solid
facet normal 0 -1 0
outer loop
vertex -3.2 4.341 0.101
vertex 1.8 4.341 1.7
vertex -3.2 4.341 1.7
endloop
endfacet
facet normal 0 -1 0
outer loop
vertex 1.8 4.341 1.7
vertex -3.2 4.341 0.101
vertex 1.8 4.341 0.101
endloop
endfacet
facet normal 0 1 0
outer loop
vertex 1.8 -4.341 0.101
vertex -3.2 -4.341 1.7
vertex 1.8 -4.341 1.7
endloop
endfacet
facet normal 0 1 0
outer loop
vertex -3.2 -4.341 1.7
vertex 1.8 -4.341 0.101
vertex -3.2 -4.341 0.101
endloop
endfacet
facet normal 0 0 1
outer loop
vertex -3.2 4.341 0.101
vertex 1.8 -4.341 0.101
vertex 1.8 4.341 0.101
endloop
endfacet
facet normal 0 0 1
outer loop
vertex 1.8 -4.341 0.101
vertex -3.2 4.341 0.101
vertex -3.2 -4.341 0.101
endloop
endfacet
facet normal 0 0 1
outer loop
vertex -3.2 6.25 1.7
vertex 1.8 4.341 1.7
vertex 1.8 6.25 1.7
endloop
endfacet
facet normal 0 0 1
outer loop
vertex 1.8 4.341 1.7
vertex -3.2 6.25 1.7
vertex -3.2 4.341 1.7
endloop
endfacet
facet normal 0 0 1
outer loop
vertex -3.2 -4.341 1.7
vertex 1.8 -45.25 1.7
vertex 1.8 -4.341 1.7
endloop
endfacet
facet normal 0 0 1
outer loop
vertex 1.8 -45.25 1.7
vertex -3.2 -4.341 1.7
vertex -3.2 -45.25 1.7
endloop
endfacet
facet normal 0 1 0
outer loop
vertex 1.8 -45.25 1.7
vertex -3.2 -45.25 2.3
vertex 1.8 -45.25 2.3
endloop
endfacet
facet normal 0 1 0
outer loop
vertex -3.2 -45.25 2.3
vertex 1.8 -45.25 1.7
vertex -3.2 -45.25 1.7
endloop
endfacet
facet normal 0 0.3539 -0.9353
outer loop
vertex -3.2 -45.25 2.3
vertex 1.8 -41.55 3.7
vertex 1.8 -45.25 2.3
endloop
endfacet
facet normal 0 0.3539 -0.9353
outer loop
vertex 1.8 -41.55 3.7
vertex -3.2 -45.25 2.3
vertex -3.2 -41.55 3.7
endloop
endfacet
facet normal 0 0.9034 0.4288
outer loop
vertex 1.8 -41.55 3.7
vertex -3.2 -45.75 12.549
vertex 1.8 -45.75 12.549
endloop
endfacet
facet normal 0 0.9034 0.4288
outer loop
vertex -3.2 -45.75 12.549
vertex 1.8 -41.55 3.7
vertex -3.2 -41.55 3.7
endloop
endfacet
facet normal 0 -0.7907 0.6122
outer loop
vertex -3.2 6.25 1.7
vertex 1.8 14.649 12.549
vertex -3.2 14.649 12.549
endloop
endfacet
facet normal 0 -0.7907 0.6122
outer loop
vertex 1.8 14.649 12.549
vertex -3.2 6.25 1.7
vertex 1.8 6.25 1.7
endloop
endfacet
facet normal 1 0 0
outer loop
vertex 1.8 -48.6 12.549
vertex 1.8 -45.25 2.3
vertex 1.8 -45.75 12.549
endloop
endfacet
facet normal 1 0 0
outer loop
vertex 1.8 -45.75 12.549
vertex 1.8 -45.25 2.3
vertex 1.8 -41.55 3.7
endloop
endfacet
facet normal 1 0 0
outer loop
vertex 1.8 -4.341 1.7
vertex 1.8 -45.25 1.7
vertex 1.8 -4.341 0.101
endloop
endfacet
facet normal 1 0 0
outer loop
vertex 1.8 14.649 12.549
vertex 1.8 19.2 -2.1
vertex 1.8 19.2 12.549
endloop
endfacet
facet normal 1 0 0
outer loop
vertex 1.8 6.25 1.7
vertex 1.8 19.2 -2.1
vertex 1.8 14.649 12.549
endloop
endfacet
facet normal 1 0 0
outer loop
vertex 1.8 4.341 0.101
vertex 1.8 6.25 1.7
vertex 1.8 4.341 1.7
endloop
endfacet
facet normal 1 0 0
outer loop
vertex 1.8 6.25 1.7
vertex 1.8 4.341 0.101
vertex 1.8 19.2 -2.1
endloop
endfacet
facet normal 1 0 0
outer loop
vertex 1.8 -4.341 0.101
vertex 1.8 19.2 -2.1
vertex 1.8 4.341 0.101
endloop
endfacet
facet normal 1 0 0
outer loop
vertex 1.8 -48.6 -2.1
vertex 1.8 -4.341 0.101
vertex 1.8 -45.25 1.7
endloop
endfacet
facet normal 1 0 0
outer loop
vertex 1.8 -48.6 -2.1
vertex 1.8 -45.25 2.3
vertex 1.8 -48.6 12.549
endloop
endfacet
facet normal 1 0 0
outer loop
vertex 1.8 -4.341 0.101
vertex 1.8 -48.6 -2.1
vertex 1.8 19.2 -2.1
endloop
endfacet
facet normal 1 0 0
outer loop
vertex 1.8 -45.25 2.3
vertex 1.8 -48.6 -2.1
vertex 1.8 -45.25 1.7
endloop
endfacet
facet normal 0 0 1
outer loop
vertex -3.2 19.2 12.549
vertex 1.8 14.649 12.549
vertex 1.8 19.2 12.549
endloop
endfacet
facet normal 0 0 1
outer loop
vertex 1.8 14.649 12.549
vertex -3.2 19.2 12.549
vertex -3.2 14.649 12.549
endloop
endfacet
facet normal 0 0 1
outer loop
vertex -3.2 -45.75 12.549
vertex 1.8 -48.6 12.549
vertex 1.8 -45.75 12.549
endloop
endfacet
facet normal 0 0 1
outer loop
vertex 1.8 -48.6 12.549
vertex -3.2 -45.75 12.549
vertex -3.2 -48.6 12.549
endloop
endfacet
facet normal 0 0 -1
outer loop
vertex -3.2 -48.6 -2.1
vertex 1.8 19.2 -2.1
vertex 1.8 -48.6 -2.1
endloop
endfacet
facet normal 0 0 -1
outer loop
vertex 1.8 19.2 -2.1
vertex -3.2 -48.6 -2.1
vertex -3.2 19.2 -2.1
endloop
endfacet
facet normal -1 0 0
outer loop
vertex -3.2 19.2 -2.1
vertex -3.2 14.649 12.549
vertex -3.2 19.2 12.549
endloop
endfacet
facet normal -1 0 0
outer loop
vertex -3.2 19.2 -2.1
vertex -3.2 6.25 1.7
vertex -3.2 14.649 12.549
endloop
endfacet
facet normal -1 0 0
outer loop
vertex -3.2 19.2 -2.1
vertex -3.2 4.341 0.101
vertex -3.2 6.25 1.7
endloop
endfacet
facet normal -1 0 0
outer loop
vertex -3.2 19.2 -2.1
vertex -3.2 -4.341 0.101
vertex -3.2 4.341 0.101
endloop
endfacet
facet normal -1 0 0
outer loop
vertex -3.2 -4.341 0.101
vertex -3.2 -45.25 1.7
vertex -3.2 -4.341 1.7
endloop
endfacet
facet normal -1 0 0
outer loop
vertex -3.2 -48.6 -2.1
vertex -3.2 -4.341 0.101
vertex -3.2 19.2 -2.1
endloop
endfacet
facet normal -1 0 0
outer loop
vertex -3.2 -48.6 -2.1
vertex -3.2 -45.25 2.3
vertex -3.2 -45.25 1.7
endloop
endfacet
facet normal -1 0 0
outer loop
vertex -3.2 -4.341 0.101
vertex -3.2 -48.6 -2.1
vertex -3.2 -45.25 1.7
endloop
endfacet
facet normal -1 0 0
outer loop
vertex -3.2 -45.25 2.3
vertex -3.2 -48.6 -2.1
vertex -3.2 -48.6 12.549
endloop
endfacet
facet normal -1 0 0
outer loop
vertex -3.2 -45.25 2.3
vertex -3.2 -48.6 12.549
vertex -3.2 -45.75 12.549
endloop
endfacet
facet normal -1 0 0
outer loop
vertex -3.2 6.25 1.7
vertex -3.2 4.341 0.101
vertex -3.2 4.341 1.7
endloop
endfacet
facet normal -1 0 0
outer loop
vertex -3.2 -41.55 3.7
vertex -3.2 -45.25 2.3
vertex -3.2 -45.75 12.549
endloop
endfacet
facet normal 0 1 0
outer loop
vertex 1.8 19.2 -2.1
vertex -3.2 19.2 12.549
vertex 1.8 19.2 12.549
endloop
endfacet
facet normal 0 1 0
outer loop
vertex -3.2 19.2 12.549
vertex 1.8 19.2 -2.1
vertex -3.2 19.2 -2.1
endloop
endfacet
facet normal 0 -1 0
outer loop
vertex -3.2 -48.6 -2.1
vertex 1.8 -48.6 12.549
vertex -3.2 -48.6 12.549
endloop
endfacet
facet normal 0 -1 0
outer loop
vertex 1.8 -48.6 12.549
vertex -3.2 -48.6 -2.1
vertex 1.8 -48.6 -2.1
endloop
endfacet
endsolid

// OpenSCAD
// Bosch Kiox display holder

// point 0,0,0 is at the center of the magnetic part

// Some material definitions
// defaults in prusa slicer 0.15 height (0.2 first layer)
layer_1=0.2;
layer_n=0.15;

// overall (max measurements)
disp_w=46.4; // rough measurement
disp_l=67.8; // also rough measurement
// base
base_w=36.6;
base_l=52.8;

// oval part which holds the display in place
magnet_part_d1=8.4;
magnet_part_d2=20.4-magnet_part_d1;
magnet_part_h=1.7;

top_disp=24.4-magnet_part_d1/2; // from the top

// nodge to align the display at the bottom
base_a_disp=39.25+1.5+magnet_part_d1/2;
height_a=magnet_part_h;
height_b=height_a+2;
height_c=height_a+10.85;
height_d=height_a+12.8;

module magnet_part(
        d1=magnet_part_d1+0.3,
        d2=magnet_part_d2,
        h=magnet_part_h,
        fix=0.1        
    ) {
    hull() {
        // make heigt a bit smaller to really have
        // the magnets stick (no air in between)
        translate([-d2/2,0,fix+0.001])
            cylinder(h=h-fix,d=d1);
        translate([d2/2,0,fix+0.001])
            cylinder(h=h-fix,d=d1);
    }
}

module magnets(
        d1=magnet_part_d1+0.2,
        d2=magnet_part_d2,
        h=magnet_part_h,
        fix=0.1,
        magnet_w=5,
        magnet_h=1+0.6 // plus double sided tape thickness
    ) {
    translate([0,-magnet_w/2,-magnet_h+fix+0.002-layer_n*1]) {
        translate([(-d2-magnet_w)/2,0,0])
            cube([magnet_w,magnet_w,magnet_h]);
        translate([( d2-magnet_w)/2,0,0])
            cube([magnet_w,magnet_w,magnet_h]);
    }
}

// model countersunk screw for 3d printing
// useful for creating attachement bores
// which fit these screws
// default values are for 3mm x 20mm screw with 6mm head (3.2mm bore for tolerance)
module screw_countersunk(
        z  = height_a, //displacement z
        l  = 22,     //length
        dh =  7.3,   //head dia
        db =  3.3,   //base dia (smaller icw ds)
        lh =  2.2,   //head length
        ds =  3.9,   //shaft dia
        )
{
    translate([0,0,z-lh+0.01])
        cylinder(h=lh, r1=db/2, r2=dh/2, $fn=20);
    translate([0,0,z-lh+0.02-l])
        cylinder(h=l, d=ds, $fn=20);
}
*translate([-disp_w/4,-10,0.1]) screw_countersunk();


module back_plate(
    ) {
    
    // a is base plane
    za=height_a;
    xa1=19.5/2; ya1=-0.3;
    xa2=22.0/2; ya2=03.4; 
    xa3=25.0/2; ya3=ya2;
    xa4=31.4/2; ya4=24.2;
    xa5=35.8/2; ya5=ya4;
    xa6=32.8/2; ya6=ya4+27;
    points_a = [
        [-xa1,ya1,za],
        [-xa2,ya2,za],
        [-xa3,ya3,za],
        [-xa4,ya4,za],
        [-xa5,ya5,za],
        [-xa6,ya6,za],
        [ xa6,ya6,za],
        [ xa5,ya5,za],
        [ xa4,ya4,za],
        [ xa3,ya3,za],
        [ xa2,ya2,za],
        [ xa1,ya1,za]
    ];
    
    // c is just below display
    zc=height_c;
    xc3=35.0/2;   yc3=-0.8;
    xc4=40.2/2;   yc4=-3+16.65+1;
    xc5=xc4+2.45; yc5=yc4;
    xc6=41.5/2;   yc6=ya6+8.4;
    points_c = [
        [-xc3,yc3,zc],
        [-xc4,yc4,zc],
        [-xc5,yc5,zc],
        [-xc6,yc6,zc],
        [ xc6,yc6,zc],
        [ xc5,yc5,zc],
        [ xc4,yc4,zc],
        [ xc3,yc3,zc]
    ];

    // b is just a nodge above base plane
    zb=height_b;
    zab=za+(zb-za)*0.3; 
    xb1=xa1; yb1=ya1;
    xb2=xa2; yb2=ya2;
    points_b = [
        [-xb1,yb1,zab], 
        [-xb2,yb2,zb],
        [ xb2,yb2,zb],
        [ xb1,yb1,zab]
    ];
    
    // each layer has 12 points
    // when looking on the display with screen face down
    // faces go counter clockwise
    faces= [
      // a or bot 0-11
      [ for (i = [11:-1:0]) i ],
      // nodge
      [0,1,13,12],[10,11,15,14],[0,12,15,11],[12,13,14,15],
      // bottom
      [1,2,16,23,9,10,14,13],
      // right side
      [2,3,17,16],[3,4,18,17],[4,5,19,18],
      [5,6,20,19], //top
      [6,7,21,20],[7,8,22,21],[8,9,23,22],
      // c or top 16-23
      [ for (i = [16:23]) i ],
    ];
    
    difference() {
        translate([0,-base_a_disp,0])
            polyhedron(
                points=concat(points_a,points_b, points_c),
                faces=faces,
                convexity=1000);
    }
}

module kiox() {
    magnet_part();
    back_plate();
}

// layer 1 is thicker than the next layers
l1=0.2;
ln=0.15;

m=2.1; //material thickness

$fn=50;

difference() {
    translate([-disp_w/2,-base_a_disp-3.65,-m]) {
        *cube([disp_w,disp_l-13.5,m+height_c-1]);
        
        // t1
        translate([20,0,0])
        cube([5,disp_l,m+height_c-0.001]);
        
        //t2
        *translate([0,0,m+magnet_part_h])
        *cube([disp_w,disp_l-7,l1+ln]);
        
    }
    kiox();
    *magnets();
    *translate([-disp_w/4,-10,0.01]) screw_countersunk();
    *translate([ disp_w/4,-10,0.01]) screw_countersunk();
    *translate([        0,-35,0.01]) screw_countersunk();
}
